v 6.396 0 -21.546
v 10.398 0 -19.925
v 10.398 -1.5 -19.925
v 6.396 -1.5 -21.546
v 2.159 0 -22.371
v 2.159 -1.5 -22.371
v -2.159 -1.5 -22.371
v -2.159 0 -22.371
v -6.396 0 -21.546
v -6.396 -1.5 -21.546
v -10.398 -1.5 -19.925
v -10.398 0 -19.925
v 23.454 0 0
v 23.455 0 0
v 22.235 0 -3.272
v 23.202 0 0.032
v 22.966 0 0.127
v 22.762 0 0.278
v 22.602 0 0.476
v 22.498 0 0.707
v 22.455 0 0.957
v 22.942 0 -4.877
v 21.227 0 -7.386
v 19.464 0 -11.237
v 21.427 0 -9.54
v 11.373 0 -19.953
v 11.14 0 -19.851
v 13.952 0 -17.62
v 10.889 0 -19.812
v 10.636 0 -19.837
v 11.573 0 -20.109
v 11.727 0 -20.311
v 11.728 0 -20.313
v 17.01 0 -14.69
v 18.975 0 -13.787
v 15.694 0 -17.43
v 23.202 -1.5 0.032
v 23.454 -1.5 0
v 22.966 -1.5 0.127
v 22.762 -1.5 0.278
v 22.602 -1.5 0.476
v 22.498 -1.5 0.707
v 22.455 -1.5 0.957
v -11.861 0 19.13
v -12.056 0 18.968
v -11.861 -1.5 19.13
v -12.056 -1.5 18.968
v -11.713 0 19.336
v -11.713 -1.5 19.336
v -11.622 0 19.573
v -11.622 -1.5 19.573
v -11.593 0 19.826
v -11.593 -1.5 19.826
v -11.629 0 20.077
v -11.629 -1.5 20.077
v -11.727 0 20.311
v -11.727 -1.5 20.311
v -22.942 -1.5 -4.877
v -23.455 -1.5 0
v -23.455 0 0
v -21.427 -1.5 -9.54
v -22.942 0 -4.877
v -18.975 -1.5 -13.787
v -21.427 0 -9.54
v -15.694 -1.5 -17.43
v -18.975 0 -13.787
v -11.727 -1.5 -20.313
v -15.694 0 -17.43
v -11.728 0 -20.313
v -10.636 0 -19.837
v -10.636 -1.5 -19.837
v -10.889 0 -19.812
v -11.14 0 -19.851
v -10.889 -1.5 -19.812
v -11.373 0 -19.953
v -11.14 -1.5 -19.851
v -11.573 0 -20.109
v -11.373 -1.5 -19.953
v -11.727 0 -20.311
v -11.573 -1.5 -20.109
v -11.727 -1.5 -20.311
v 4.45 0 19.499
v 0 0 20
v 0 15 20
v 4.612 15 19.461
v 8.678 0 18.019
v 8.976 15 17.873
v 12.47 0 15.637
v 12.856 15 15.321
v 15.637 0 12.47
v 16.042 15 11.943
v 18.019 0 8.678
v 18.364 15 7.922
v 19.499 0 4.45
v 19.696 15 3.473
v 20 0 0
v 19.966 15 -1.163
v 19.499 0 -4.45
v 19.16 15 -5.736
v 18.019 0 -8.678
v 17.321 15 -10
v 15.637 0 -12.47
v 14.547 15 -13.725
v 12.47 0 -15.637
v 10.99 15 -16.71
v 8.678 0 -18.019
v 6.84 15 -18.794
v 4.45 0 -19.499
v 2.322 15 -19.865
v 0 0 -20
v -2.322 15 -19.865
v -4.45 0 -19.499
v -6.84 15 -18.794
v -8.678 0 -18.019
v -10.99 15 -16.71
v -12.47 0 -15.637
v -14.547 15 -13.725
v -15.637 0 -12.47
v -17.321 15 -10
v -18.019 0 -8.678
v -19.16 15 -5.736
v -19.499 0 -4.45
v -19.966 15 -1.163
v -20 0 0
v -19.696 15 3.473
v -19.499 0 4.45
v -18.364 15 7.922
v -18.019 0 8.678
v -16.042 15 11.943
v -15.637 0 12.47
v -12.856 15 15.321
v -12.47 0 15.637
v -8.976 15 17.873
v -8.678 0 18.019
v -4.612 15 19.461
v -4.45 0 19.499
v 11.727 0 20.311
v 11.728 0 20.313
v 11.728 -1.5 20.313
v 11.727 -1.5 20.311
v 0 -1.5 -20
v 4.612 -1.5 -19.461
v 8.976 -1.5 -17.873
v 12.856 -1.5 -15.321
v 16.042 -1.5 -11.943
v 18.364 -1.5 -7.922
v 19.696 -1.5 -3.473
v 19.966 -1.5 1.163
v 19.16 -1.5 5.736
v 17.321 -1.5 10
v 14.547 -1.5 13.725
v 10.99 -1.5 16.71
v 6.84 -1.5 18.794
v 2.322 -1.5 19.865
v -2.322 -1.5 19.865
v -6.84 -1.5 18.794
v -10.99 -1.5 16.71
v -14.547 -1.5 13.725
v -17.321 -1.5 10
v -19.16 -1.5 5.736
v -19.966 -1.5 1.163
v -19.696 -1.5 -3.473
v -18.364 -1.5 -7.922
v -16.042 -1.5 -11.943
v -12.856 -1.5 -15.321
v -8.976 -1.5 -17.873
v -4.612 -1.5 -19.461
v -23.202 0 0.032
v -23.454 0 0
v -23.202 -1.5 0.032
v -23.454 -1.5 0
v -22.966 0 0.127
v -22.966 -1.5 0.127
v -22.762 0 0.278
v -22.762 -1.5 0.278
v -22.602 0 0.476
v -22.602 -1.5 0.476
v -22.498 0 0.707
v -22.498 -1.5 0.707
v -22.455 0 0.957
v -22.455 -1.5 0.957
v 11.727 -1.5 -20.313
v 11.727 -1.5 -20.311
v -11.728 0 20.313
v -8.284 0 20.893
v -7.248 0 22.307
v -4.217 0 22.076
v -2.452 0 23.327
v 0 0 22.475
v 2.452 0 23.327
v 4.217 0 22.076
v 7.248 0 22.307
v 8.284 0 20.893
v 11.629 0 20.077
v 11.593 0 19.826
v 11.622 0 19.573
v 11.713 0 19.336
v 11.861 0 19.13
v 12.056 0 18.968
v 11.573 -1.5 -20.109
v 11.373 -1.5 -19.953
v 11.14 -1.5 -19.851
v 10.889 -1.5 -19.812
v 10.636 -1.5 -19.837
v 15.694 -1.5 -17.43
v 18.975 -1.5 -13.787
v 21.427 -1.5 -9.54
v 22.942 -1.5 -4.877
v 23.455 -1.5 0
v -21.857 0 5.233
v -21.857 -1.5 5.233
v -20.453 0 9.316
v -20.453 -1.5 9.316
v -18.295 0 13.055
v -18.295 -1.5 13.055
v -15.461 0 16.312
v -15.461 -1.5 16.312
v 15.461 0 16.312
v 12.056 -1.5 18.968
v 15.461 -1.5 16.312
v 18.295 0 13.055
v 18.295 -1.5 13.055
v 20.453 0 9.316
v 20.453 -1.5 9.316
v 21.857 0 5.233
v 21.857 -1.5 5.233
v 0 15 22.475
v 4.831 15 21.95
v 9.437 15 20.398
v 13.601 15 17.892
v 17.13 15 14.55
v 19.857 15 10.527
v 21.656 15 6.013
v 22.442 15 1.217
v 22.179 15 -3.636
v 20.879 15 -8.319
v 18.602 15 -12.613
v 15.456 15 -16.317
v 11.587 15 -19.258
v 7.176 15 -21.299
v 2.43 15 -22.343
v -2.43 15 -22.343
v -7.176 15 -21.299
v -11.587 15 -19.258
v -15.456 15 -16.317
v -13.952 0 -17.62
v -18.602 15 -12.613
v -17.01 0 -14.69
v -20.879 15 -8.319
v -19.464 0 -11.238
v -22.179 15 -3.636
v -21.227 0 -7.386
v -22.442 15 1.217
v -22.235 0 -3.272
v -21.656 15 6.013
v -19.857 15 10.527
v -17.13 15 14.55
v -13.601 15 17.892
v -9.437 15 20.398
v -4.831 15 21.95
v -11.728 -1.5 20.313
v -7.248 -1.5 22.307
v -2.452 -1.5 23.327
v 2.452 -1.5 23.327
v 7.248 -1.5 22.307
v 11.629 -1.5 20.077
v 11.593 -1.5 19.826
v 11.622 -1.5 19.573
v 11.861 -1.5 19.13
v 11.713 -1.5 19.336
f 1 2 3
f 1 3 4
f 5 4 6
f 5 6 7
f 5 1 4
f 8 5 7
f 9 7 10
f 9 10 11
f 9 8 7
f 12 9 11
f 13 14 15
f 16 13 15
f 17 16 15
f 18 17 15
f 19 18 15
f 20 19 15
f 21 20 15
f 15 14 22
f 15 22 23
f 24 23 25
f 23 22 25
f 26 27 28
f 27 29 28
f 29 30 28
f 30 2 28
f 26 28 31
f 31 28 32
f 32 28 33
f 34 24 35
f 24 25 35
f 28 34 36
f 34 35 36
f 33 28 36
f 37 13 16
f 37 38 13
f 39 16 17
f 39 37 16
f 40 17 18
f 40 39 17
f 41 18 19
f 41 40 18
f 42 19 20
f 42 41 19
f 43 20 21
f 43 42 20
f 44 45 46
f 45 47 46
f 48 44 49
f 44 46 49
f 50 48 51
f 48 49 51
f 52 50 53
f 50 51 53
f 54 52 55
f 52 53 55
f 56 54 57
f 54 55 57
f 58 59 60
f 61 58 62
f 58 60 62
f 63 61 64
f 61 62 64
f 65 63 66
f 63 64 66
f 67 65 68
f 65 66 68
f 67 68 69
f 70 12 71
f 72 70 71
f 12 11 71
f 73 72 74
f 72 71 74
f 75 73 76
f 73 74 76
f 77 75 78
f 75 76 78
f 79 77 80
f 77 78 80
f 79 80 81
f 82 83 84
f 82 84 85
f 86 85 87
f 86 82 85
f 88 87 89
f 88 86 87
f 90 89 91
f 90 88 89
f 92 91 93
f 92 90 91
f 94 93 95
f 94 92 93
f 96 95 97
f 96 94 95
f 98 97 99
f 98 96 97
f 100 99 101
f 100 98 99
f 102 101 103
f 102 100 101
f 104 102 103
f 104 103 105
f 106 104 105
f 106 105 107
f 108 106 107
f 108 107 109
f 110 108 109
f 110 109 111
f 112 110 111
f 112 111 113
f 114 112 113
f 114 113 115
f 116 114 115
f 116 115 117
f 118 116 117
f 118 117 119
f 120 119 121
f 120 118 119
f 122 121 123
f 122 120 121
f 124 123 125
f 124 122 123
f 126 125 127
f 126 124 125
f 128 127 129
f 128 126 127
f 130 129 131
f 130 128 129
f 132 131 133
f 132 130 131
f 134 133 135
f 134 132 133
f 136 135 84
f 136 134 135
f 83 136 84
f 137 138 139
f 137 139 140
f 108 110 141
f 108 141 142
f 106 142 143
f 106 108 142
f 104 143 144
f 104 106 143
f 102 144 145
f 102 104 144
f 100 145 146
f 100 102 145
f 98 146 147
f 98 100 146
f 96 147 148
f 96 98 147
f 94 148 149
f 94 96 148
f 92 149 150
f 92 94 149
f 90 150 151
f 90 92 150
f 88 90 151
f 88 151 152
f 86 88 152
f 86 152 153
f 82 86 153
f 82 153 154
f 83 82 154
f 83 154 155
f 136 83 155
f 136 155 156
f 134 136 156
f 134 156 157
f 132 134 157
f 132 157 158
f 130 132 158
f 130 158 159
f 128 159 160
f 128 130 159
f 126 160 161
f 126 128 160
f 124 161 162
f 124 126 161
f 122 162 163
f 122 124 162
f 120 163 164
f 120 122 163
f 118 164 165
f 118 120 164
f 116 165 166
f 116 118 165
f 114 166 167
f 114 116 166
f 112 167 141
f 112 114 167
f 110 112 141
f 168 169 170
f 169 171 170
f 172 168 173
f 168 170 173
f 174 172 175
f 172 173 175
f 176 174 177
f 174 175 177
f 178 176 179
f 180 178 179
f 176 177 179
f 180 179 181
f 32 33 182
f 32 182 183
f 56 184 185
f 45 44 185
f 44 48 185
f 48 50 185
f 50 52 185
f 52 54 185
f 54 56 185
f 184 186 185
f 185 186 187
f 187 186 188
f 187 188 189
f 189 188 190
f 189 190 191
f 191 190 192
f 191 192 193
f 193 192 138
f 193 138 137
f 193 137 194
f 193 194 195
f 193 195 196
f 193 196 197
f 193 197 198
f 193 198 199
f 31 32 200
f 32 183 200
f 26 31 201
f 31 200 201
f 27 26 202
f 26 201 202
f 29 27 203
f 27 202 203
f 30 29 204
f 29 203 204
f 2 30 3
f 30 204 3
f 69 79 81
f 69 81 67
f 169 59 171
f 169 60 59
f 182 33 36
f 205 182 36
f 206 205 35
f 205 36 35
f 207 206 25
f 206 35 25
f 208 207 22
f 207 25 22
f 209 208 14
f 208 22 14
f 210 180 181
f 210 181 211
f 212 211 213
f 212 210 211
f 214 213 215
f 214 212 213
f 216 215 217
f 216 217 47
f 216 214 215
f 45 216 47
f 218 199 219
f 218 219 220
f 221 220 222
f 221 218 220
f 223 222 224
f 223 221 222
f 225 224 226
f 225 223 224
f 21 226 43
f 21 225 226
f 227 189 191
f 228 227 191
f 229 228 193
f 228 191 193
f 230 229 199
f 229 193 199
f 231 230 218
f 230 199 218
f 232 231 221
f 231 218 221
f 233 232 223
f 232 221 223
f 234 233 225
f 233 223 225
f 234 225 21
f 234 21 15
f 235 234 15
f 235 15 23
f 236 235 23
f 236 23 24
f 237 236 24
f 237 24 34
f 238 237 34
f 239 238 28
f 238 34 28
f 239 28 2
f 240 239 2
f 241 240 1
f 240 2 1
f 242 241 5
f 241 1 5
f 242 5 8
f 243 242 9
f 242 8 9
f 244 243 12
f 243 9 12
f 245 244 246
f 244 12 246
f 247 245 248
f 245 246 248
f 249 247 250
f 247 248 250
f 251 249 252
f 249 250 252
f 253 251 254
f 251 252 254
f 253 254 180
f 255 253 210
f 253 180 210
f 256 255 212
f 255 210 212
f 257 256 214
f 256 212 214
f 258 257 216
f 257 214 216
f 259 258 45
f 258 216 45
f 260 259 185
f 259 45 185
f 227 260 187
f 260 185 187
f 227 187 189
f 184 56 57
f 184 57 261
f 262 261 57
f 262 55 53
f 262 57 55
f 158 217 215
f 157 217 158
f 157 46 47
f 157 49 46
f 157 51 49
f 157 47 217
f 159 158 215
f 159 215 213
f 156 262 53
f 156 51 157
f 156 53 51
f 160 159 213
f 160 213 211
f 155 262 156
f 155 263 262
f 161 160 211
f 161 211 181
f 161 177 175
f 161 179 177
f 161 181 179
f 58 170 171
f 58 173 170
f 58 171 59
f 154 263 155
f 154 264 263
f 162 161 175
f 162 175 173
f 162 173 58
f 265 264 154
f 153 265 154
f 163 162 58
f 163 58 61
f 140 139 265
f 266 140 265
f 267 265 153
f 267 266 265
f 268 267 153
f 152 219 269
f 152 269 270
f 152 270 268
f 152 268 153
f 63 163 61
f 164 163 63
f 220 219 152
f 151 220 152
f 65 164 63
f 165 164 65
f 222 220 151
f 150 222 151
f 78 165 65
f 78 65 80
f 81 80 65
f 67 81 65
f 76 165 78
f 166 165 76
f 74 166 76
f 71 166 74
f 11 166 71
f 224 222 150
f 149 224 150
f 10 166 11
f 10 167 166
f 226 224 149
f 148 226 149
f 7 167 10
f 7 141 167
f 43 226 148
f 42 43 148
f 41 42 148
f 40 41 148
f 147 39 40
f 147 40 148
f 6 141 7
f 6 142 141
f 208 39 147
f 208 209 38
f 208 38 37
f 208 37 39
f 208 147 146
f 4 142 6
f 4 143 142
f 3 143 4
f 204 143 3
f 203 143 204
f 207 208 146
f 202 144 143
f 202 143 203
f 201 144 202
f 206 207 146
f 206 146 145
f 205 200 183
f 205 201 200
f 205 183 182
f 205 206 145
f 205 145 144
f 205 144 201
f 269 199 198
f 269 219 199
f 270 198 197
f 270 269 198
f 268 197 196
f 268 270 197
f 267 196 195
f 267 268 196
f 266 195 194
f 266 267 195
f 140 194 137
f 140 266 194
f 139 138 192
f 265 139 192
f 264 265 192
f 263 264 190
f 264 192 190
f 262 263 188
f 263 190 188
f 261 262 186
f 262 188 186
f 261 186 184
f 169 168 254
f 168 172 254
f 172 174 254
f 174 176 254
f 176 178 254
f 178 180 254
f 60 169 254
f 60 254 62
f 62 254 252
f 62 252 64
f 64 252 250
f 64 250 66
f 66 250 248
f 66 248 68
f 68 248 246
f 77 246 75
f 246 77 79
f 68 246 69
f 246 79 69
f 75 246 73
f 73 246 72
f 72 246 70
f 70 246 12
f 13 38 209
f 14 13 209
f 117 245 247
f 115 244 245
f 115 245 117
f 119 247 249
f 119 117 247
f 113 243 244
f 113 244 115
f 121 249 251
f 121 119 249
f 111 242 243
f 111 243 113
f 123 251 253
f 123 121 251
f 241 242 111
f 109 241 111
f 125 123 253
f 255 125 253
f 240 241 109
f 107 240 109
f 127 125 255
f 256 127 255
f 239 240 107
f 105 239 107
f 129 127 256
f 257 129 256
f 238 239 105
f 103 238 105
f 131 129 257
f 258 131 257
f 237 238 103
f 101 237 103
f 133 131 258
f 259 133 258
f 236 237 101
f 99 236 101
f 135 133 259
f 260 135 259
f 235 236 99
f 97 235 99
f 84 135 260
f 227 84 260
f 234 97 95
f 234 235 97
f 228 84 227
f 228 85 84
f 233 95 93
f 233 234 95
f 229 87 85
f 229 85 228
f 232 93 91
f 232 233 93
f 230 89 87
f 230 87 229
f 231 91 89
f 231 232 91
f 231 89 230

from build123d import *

# Parameters (mm, degrees)
SKETCH1_R           = 22.475
SKETCH1_R_2         = 20
BOSS_EXTRUDE1_DEPTH = 15
SKETCH2_R           = 23.455
SKETCH2_R_2         = 20
BOSS_EXTRUDE2_DEPTH = 1.5
CUT_EXTRUDE3_DEPTH  = 10
CIRPATTERN1_COUNT   = 3
FILLET1_R           = 1


with BuildPart() as part:
    # Sketch1 → Boss-Extrude1 (new body)
    with BuildSketch(Plane(origin=(0, 0, 0), x_dir=(1, 0, 0), z_dir=(0, 1, 0))):
        with Locations(Location((0, 0, 0), (0, 0, 270))):
            Circle(SKETCH1_R)
        with Locations(Location((0, 0, 0), (0, 0, 270))):
            Circle(SKETCH1_R_2, mode=Mode.SUBTRACT)
    extrude(amount=BOSS_EXTRUDE1_DEPTH)

    # Sketch2 → Boss-Extrude2 (add)
    with BuildSketch(Plane.XZ):
        with Locations(Location((0, 0, 0), (0, 0, 270))):
            Circle(SKETCH2_R)
        with Locations(Location((0, 0, 0), (0, 0, 270))):
            Circle(SKETCH2_R_2, mode=Mode.SUBTRACT)
    extrude(amount=BOSS_EXTRUDE2_DEPTH)

    # Sketch4 → Cut-Extrude3 (cut)
    with BuildSketch(Plane(origin=(0, 0, 0), x_dir=(1, 0, 0), z_dir=(0, 1, 0))):
        with BuildLine():
            Line((-11.2375, 19.463921), (-11.7275, 20.312626))
            ThreePointArc((-11.7275, 20.312626), (0, 23.455), (11.7275, 20.312626))
            Line((11.7275, 20.312626), (11.2375, 19.463921))
            ThreePointArc((11.2375, 19.463921), (0, 22.475), (-11.2375, 19.463921))
        make_face()
    cut_extrude3 = extrude(amount=-CUT_EXTRUDE3_DEPTH, mode=Mode.SUBTRACT)

    # CirPattern1: Cut-Extrude3 ×3 about axis
    cirpattern1_axis = Axis((0, 0, 0), (0, 1, 0))
    for i in range(1, CIRPATTERN1_COUNT):
        add(cut_extrude3.rotate(cirpattern1_axis, i * 360 / CIRPATTERN1_COUNT), mode=Mode.SUBTRACT)

    # Fillet1
    fillet1_edges = [part.edges().sort_by_distance(p)[0] for p in [
        (11.2375, -0.75, -19.463921),
        (-11.2375, -0.75, -19.463921),
        (-22.475, -0.75, 0),
        (-11.2375, -0.75, 19.463921),
        (11.2375, -0.75, 19.463921),
        (22.475, -0.75, 0),
    ]]
    fillet(fillet1_edges, radius=FILLET1_R)


solid = part.part
